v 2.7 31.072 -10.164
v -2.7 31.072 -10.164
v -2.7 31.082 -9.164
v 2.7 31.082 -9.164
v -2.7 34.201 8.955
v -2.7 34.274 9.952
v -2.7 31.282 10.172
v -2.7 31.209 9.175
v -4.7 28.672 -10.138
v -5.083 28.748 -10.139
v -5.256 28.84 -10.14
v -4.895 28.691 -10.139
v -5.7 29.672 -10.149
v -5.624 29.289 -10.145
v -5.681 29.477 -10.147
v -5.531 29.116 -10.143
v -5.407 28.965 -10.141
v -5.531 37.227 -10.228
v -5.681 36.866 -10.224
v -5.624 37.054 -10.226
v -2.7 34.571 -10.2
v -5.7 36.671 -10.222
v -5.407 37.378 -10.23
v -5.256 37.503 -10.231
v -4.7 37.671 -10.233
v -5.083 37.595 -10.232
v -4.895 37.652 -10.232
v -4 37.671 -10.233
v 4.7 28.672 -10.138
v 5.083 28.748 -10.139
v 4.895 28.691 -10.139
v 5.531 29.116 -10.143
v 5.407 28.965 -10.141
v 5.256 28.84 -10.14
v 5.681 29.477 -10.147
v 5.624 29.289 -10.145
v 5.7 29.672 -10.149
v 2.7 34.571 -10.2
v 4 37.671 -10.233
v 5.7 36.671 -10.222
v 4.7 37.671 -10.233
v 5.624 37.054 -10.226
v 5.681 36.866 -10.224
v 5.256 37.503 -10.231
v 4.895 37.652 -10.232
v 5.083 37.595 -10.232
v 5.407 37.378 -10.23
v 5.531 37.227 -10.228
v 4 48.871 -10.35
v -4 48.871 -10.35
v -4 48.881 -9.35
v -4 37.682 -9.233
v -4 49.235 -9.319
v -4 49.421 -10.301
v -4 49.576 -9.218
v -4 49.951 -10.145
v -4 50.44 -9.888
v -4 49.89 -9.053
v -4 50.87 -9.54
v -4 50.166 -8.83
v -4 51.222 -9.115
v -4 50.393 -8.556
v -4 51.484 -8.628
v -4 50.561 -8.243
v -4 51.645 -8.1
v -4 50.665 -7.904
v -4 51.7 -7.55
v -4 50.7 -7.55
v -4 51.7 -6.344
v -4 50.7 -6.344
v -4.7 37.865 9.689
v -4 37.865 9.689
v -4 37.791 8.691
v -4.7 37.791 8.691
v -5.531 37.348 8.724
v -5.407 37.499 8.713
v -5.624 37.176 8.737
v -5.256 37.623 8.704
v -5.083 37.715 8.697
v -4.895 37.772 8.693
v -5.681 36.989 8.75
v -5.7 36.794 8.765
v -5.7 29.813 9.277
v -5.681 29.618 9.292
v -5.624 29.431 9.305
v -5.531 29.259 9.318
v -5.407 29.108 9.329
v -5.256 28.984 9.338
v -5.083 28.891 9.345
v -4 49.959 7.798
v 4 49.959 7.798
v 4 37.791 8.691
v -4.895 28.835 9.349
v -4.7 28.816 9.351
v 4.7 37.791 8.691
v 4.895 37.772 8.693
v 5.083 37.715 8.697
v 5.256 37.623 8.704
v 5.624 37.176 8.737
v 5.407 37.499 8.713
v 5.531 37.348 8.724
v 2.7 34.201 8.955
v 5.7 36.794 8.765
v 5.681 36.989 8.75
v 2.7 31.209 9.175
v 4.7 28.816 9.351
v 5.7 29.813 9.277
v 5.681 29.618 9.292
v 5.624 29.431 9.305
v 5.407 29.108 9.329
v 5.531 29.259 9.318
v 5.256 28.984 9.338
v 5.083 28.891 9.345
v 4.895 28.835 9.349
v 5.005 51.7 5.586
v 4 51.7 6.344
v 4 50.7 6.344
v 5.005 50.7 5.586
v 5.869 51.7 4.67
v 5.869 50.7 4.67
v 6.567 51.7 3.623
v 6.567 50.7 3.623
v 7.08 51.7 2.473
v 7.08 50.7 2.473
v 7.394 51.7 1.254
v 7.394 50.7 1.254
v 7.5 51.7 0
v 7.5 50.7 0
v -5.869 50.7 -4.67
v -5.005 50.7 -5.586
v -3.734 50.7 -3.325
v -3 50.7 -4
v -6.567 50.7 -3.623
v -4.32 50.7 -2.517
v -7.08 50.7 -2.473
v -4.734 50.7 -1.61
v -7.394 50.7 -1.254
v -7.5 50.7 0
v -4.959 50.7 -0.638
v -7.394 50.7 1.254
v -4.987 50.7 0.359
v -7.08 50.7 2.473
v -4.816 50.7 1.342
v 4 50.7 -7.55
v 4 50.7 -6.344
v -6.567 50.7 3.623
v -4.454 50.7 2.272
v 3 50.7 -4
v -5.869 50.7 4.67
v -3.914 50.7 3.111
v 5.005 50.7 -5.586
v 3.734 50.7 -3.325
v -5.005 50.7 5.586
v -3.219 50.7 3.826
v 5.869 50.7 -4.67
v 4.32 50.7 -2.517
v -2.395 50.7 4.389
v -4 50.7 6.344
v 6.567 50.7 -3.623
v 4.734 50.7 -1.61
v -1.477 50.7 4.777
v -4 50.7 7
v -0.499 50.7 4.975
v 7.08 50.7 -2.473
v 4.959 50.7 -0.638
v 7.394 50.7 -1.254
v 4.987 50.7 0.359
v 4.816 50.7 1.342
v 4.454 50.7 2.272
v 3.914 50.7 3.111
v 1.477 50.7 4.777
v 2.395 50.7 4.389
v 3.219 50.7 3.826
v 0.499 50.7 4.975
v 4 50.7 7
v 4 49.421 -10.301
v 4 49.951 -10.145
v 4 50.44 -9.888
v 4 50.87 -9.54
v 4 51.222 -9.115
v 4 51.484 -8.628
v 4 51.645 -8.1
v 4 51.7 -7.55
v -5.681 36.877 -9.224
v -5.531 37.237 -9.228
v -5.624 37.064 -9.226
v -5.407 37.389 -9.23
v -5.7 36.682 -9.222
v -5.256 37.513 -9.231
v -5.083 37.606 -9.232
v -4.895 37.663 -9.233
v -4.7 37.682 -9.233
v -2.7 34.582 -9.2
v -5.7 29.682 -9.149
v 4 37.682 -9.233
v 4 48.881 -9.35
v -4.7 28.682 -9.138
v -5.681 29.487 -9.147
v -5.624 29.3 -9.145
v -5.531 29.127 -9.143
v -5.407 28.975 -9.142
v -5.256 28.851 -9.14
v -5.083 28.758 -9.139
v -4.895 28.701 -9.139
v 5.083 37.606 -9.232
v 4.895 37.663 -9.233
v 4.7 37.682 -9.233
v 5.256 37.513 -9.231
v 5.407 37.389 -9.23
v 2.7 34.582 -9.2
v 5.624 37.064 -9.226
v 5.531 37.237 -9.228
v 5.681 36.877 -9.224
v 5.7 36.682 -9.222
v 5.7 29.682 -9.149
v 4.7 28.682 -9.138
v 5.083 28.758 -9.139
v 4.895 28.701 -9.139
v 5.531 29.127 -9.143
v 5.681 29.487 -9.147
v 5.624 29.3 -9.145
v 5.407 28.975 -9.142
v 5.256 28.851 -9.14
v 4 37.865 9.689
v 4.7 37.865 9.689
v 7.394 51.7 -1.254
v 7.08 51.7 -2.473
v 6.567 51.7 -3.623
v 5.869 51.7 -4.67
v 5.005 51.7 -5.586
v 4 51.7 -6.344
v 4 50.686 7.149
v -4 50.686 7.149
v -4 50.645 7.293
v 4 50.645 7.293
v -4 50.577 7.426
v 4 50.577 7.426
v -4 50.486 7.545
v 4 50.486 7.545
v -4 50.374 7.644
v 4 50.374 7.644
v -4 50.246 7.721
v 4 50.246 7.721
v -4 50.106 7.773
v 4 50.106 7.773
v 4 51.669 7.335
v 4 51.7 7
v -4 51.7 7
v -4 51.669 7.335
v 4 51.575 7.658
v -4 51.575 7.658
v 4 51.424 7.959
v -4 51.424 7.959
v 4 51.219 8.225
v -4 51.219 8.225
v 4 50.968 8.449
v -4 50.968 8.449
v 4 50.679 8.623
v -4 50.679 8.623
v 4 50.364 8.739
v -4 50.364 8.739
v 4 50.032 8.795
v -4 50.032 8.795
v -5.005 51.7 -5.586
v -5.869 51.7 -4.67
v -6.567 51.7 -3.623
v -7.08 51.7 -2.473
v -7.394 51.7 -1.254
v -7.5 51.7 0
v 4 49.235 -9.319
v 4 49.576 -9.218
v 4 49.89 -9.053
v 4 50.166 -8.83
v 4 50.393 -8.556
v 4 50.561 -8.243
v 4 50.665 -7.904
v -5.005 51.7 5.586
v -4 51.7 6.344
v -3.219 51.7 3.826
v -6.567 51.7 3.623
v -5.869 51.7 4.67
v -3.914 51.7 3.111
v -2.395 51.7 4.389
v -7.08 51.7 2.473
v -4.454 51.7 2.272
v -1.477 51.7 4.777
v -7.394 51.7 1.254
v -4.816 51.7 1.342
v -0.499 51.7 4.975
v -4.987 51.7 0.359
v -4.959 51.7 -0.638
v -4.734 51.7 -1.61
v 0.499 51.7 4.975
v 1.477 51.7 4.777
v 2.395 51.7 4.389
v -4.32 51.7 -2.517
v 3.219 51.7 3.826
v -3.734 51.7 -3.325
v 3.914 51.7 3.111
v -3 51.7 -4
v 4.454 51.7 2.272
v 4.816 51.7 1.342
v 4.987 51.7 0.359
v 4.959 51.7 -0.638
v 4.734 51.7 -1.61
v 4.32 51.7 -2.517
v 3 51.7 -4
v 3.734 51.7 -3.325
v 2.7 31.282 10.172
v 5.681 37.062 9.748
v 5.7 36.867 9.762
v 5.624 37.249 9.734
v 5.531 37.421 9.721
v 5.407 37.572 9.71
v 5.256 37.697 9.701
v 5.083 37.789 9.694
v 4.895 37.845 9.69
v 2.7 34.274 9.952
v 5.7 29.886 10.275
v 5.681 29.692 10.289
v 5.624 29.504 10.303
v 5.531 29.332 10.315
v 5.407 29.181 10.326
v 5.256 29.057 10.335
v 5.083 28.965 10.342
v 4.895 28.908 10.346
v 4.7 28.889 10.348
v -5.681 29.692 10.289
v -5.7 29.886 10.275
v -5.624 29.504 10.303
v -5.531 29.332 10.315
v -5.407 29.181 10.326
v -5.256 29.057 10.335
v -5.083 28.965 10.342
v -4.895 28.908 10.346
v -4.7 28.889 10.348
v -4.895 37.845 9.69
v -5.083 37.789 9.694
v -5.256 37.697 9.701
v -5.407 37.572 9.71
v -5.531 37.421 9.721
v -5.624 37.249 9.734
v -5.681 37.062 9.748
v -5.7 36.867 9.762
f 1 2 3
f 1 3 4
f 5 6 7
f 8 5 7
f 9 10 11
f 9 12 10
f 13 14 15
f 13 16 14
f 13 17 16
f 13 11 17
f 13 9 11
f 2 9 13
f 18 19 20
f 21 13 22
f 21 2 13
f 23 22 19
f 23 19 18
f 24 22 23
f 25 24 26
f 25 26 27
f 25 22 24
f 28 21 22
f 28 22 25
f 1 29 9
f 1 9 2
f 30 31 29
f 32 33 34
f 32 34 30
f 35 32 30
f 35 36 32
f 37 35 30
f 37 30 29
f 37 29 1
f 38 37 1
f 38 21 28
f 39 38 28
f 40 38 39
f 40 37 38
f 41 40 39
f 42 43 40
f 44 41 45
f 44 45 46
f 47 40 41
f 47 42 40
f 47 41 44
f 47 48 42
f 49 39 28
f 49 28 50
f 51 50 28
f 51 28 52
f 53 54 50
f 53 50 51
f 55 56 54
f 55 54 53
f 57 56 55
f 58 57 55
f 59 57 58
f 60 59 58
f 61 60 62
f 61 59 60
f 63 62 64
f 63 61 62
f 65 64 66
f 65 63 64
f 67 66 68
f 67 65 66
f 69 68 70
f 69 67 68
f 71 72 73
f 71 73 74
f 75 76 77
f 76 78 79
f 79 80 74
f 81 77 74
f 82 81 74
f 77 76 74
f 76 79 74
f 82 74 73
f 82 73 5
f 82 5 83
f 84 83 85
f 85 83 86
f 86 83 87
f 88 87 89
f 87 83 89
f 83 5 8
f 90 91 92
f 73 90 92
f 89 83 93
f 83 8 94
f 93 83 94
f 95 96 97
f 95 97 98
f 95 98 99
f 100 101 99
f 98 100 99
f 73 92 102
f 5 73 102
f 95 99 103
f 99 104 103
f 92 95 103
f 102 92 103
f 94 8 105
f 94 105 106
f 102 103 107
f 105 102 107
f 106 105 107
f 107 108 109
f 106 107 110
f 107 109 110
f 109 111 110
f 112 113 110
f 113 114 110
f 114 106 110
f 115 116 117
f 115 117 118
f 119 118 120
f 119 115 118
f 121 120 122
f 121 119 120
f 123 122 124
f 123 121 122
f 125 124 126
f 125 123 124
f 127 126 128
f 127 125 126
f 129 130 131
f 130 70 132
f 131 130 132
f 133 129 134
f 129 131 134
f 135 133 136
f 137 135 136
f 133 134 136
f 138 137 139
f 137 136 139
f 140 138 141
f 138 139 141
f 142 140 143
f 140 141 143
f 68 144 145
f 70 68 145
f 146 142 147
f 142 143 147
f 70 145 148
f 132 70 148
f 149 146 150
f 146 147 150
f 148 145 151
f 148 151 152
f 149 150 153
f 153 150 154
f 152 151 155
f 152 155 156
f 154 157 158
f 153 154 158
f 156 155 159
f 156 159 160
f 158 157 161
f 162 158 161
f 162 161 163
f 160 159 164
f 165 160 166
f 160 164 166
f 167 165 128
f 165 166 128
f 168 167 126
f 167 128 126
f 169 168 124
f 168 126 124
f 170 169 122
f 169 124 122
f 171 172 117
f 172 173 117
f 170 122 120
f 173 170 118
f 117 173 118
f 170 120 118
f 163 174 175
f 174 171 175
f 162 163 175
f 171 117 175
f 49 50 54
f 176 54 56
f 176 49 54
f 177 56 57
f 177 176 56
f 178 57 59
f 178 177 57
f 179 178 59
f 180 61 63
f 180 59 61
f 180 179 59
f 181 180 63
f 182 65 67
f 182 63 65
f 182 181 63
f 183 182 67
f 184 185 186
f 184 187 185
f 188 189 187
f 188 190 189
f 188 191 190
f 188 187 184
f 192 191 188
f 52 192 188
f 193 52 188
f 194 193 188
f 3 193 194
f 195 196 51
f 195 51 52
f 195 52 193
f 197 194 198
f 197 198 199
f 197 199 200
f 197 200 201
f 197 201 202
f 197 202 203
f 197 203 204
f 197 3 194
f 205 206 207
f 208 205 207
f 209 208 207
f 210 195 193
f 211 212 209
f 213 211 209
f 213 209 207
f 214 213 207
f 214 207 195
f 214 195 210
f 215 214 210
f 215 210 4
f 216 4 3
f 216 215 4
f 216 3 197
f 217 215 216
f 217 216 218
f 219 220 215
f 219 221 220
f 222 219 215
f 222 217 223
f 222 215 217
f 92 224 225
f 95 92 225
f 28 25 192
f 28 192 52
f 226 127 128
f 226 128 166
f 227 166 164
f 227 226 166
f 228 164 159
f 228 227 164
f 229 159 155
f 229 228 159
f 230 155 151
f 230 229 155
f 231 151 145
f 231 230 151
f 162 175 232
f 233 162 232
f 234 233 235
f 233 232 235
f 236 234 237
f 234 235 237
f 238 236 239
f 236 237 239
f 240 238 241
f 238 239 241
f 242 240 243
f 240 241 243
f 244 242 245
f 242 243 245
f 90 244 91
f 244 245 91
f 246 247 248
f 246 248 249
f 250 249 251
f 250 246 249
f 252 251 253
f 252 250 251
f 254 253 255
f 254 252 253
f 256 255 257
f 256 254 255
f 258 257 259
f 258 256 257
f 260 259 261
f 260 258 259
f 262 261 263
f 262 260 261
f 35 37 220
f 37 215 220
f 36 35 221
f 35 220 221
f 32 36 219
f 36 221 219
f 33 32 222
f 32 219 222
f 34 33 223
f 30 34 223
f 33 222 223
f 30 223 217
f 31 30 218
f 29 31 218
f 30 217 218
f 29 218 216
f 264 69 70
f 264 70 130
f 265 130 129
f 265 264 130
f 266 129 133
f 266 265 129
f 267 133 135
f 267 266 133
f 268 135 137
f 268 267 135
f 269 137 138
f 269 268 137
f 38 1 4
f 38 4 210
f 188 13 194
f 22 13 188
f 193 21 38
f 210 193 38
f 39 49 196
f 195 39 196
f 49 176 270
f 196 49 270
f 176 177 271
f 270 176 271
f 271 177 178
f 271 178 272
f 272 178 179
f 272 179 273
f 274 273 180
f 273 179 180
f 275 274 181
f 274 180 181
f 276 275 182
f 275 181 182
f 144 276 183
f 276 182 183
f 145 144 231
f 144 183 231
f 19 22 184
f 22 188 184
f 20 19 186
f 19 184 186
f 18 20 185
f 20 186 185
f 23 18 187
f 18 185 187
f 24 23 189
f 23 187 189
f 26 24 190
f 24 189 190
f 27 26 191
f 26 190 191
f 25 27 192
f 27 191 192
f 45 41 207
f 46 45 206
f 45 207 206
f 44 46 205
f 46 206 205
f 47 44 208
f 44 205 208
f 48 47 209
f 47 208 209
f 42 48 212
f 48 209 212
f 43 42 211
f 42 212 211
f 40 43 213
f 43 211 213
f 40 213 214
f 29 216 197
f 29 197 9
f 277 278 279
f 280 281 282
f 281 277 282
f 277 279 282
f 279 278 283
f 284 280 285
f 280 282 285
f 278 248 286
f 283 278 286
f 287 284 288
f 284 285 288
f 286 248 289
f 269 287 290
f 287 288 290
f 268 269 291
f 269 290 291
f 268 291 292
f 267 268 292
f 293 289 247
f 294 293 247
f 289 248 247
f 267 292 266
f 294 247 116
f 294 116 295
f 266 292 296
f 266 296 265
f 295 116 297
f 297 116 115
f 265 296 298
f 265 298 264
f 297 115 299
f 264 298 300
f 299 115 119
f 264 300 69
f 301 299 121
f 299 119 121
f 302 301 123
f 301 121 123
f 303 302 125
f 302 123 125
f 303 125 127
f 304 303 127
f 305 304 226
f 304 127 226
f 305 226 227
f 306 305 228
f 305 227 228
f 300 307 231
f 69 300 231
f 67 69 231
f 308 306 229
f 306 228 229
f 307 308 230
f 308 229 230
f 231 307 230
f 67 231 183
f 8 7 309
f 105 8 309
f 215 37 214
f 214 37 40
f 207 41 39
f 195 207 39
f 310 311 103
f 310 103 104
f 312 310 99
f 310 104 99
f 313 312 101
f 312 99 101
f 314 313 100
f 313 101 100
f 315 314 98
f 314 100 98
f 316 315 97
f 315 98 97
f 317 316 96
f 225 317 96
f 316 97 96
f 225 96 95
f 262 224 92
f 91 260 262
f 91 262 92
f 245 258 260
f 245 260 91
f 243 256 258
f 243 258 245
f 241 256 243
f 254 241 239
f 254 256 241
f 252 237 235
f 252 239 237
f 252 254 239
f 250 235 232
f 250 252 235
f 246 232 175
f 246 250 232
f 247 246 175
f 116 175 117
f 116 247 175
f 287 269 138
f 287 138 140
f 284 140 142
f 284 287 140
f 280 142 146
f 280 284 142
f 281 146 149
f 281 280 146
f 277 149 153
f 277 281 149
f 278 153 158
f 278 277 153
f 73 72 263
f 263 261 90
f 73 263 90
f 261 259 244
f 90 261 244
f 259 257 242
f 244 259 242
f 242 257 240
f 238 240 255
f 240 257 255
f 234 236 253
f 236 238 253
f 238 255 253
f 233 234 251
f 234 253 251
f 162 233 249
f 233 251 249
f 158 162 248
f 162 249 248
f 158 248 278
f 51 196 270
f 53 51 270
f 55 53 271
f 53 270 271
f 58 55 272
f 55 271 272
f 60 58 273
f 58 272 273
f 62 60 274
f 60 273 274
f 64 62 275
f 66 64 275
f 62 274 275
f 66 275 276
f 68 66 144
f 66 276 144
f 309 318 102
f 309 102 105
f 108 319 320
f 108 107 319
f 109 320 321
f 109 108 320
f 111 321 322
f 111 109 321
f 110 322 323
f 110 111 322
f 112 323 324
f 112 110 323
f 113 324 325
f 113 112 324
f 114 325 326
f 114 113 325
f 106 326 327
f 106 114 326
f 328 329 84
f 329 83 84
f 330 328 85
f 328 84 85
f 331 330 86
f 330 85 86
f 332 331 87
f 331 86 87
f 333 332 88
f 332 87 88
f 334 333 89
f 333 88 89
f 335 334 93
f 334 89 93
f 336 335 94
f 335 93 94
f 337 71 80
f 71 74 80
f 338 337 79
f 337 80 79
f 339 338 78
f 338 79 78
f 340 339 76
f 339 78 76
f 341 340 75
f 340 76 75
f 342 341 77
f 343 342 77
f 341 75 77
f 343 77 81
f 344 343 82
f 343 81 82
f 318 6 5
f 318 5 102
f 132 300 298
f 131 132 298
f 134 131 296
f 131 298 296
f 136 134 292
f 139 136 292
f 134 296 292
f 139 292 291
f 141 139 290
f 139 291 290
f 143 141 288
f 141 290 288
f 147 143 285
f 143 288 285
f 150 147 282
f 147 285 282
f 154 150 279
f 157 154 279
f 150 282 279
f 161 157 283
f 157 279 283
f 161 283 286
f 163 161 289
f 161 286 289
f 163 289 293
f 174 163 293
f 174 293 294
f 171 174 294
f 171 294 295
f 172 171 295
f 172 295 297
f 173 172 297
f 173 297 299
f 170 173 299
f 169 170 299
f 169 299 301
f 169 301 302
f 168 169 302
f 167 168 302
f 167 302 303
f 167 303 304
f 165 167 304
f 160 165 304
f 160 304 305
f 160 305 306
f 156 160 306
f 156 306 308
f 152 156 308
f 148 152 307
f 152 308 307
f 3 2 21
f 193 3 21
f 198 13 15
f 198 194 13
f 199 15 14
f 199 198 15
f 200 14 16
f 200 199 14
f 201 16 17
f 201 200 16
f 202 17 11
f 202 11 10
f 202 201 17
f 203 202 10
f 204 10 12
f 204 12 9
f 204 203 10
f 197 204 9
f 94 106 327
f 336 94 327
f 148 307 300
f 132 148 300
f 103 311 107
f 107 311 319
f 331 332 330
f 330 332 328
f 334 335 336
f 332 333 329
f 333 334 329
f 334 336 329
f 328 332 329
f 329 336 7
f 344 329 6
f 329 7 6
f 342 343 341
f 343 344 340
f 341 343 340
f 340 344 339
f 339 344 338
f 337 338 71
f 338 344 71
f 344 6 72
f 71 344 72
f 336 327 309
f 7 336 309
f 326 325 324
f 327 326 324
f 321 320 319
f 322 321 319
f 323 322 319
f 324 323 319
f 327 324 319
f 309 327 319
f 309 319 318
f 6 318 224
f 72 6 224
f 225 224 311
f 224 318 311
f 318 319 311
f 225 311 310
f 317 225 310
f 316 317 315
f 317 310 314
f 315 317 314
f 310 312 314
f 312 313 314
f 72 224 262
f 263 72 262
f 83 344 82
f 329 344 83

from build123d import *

# Parameters (mm, degrees)
PAD048_DEPTH    = 7.5
SKETCH077_W     = 3.5
SKETCH077_H     = 5.4
POCKET022_DEPTH = 1
SKETCH078_W     = 3
SKETCH078_H     = 5.4
POCKET023_DEPTH = 1
POCKET024_DEPTH = 3
FILLET020_R     = 1


with BuildPart() as part:
    # Sketch076 → Pad048 (new body, symmetric)
    with BuildSketch(Plane.YZ):
        with BuildLine():
            Line((25, -7.5500986951), (25, 7))
            ThreePointArc((25, 7), (24.786034319, 7.5445766952), (24.2585905577, 7.7978515818))
            Line((24.2585905577, 7.7978515818), (3.1155236405, 9.3505013609))
            Line((3.1155236405, 9.3505013609), (3.1887618377, 10.3478158381))
            Line((3.1887618377, 10.3478158381), (24.3318287548, 8.795166059))
            ThreePointArc((26, 7), (25.5185772178, 8.2252975641), (24.3318287548, 8.795166059))
            Line((26, 7), (26, -7.5500986951))
            ThreePointArc((23.1706790045, -10.3499451694), (25.1695051679, -9.540337222), (26, -7.5500986951))
            Line((2.9717865833, -10.1384151302), (23.1706790045, -10.3499451694))
            Line((2.9822583674, -9.1384699609), (2.9717865833, -10.1384151302))
            Line((23.1811507886, -9.35), (2.9822583674, -9.1384699609))
            ThreePointArc((23.1811507886, -9.35), (24.4661104651, -8.8295377481), (25, -7.5500986951))
        make_face()
    extrude(amount=PAD048_DEPTH, both=True)

    # Sketch077 (on Face10 of Pad048) → Pocket022 (cut)
    with BuildSketch(Plane(origin=(0, -0.1058355924, -10.106185168), x_dir=(0, 0.9999451694, -0.0104717841), z_dir=(0, -0.0104717841, -0.9999451694))):
        Polygon((3.0777909329, -5.7), (12.0777909329, -5.7), (12.0777909329, -4), (26.0777909329, -4), (26.0777909329, -7.5), (3.0777909329, -7.5), align=None)
        Polygon((3.0777909329, 5.7), (12.0777909329, 5.7), (12.0777909329, 4), (26.0777909329, 4), (26.0777909329, 7.5), (3.0777909329, 7.5), align=None)
        with Locations((7.2277909329, 0)):
            Rectangle(SKETCH077_W, SKETCH077_H)
    extrude(amount=-POCKET022_DEPTH, mode=Mode.SUBTRACT)

    # Sketch078 (on Face23 of Pocket022) → Pocket023 (cut)
    with BuildSketch(Plane(origin=(0, 0.7729241259, 10.52522387), x_dir=(0, -0.9973144772, 0.0732381971), z_dir=(0, 0.0732381971, 0.9973144772))):
        Polygon((-2.4223429689, 7.5), (-25.4223429689, 7.5), (-25.4223429689, 4), (-11.4223429689, 4), (-11.4223429689, 5.7), (-2.4223429689, 5.7), align=None)
        Polygon((-2.4223429689, -7.5), (-25.4223429689, -7.5), (-25.4223429689, -4), (-11.4223429689, -4), (-11.4223429689, -5.7), (-2.4223429689, -5.7), align=None)
        with Locations((-6.3223429689, 0)):
            Rectangle(SKETCH078_W, SKETCH078_H)
    extrude(amount=-POCKET023_DEPTH, mode=Mode.SUBTRACT)

    # Sketch079 (on Face21 of Pocket023) → Pocket024 (cut)
    with BuildSketch(Plane.ZX.offset(26)):
        with BuildLine():
            ThreePointArc((-6.3442887702, -4), (-3.6228442441, -6.5669627366), (-1.314e-07, -7.5))
            Line((-9.3724594748, -7.5), (-1.314e-07, -7.5))
            Line((-9.3724594748, -4), (-9.3724594748, -7.5))
            Line((-9.3724594748, -4), (-6.3442887702, -4))
        make_face()
        with BuildLine():
            ThreePointArc((3.60745e-05, -7.4999999999), (3.6228599799, -6.5669540554), (6.3442887702, -4))
            Line((9.3724594748, -4), (6.3442887702, -4))
            Line((9.3724594748, -4), (9.3724594748, -7.4999999999))
            Line((9.3724594748, -7.4999999999), (3.60745e-05, -7.4999999999))
        make_face()
        with BuildLine():
            ThreePointArc((-3.60745e-05, 7.4999999999), (-3.6228599799, 6.5669540554), (-6.3442887702, 4))
            Line((-9.3724594748, 4), (-6.3442887702, 4))
            Line((-9.3724594748, 4), (-9.3724594748, 7.4999999999))
            Line((-9.3724594748, 7.4999999999), (-3.60745e-05, 7.4999999999))
        make_face()
        with BuildLine():
            ThreePointArc((6.3442887702, 4), (3.6228599799, 6.5669540554), (3.60745e-05, 7.4999999999))
            Line((9.3724594748, 7.4999999999), (3.60745e-05, 7.4999999999))
            Line((9.3724594748, 4), (9.3724594748, 7.4999999999))
            Line((9.3724594748, 4), (6.3442887702, 4))
        make_face()
        with BuildLine():
            ThreePointArc((-4, -3), (5, 0), (-4, 3))
            Line((-4, 3), (-4, -3))
        make_face()
    extrude(amount=-POCKET024_DEPTH, mode=Mode.SUBTRACT)

    # Fillet020
    fillet020_edges = [part.edges().sort_by_distance(p)[0] for p in [
        (5.7, 2.977022, -9.638443),
        (-5.7, 2.977022, -9.638443),
        (5.7, 3.152143, 9.849159),
        (-5.7, 3.152143, 9.849159),
        (-5.7, 12.127973, 9.190015),
        (5.7, 12.127973, 9.190015),
        (5.7, 11.976529, -9.732689),
        (-5.7, 11.976529, -9.732689),
    ]]
    fillet(fillet020_edges, radius=FILLET020_R)


with BuildPart() as part_1:
    # Body027 placement: moved
    add(part.part.moved(Location((0, 25.7, 0))))


solid = part_1.part
